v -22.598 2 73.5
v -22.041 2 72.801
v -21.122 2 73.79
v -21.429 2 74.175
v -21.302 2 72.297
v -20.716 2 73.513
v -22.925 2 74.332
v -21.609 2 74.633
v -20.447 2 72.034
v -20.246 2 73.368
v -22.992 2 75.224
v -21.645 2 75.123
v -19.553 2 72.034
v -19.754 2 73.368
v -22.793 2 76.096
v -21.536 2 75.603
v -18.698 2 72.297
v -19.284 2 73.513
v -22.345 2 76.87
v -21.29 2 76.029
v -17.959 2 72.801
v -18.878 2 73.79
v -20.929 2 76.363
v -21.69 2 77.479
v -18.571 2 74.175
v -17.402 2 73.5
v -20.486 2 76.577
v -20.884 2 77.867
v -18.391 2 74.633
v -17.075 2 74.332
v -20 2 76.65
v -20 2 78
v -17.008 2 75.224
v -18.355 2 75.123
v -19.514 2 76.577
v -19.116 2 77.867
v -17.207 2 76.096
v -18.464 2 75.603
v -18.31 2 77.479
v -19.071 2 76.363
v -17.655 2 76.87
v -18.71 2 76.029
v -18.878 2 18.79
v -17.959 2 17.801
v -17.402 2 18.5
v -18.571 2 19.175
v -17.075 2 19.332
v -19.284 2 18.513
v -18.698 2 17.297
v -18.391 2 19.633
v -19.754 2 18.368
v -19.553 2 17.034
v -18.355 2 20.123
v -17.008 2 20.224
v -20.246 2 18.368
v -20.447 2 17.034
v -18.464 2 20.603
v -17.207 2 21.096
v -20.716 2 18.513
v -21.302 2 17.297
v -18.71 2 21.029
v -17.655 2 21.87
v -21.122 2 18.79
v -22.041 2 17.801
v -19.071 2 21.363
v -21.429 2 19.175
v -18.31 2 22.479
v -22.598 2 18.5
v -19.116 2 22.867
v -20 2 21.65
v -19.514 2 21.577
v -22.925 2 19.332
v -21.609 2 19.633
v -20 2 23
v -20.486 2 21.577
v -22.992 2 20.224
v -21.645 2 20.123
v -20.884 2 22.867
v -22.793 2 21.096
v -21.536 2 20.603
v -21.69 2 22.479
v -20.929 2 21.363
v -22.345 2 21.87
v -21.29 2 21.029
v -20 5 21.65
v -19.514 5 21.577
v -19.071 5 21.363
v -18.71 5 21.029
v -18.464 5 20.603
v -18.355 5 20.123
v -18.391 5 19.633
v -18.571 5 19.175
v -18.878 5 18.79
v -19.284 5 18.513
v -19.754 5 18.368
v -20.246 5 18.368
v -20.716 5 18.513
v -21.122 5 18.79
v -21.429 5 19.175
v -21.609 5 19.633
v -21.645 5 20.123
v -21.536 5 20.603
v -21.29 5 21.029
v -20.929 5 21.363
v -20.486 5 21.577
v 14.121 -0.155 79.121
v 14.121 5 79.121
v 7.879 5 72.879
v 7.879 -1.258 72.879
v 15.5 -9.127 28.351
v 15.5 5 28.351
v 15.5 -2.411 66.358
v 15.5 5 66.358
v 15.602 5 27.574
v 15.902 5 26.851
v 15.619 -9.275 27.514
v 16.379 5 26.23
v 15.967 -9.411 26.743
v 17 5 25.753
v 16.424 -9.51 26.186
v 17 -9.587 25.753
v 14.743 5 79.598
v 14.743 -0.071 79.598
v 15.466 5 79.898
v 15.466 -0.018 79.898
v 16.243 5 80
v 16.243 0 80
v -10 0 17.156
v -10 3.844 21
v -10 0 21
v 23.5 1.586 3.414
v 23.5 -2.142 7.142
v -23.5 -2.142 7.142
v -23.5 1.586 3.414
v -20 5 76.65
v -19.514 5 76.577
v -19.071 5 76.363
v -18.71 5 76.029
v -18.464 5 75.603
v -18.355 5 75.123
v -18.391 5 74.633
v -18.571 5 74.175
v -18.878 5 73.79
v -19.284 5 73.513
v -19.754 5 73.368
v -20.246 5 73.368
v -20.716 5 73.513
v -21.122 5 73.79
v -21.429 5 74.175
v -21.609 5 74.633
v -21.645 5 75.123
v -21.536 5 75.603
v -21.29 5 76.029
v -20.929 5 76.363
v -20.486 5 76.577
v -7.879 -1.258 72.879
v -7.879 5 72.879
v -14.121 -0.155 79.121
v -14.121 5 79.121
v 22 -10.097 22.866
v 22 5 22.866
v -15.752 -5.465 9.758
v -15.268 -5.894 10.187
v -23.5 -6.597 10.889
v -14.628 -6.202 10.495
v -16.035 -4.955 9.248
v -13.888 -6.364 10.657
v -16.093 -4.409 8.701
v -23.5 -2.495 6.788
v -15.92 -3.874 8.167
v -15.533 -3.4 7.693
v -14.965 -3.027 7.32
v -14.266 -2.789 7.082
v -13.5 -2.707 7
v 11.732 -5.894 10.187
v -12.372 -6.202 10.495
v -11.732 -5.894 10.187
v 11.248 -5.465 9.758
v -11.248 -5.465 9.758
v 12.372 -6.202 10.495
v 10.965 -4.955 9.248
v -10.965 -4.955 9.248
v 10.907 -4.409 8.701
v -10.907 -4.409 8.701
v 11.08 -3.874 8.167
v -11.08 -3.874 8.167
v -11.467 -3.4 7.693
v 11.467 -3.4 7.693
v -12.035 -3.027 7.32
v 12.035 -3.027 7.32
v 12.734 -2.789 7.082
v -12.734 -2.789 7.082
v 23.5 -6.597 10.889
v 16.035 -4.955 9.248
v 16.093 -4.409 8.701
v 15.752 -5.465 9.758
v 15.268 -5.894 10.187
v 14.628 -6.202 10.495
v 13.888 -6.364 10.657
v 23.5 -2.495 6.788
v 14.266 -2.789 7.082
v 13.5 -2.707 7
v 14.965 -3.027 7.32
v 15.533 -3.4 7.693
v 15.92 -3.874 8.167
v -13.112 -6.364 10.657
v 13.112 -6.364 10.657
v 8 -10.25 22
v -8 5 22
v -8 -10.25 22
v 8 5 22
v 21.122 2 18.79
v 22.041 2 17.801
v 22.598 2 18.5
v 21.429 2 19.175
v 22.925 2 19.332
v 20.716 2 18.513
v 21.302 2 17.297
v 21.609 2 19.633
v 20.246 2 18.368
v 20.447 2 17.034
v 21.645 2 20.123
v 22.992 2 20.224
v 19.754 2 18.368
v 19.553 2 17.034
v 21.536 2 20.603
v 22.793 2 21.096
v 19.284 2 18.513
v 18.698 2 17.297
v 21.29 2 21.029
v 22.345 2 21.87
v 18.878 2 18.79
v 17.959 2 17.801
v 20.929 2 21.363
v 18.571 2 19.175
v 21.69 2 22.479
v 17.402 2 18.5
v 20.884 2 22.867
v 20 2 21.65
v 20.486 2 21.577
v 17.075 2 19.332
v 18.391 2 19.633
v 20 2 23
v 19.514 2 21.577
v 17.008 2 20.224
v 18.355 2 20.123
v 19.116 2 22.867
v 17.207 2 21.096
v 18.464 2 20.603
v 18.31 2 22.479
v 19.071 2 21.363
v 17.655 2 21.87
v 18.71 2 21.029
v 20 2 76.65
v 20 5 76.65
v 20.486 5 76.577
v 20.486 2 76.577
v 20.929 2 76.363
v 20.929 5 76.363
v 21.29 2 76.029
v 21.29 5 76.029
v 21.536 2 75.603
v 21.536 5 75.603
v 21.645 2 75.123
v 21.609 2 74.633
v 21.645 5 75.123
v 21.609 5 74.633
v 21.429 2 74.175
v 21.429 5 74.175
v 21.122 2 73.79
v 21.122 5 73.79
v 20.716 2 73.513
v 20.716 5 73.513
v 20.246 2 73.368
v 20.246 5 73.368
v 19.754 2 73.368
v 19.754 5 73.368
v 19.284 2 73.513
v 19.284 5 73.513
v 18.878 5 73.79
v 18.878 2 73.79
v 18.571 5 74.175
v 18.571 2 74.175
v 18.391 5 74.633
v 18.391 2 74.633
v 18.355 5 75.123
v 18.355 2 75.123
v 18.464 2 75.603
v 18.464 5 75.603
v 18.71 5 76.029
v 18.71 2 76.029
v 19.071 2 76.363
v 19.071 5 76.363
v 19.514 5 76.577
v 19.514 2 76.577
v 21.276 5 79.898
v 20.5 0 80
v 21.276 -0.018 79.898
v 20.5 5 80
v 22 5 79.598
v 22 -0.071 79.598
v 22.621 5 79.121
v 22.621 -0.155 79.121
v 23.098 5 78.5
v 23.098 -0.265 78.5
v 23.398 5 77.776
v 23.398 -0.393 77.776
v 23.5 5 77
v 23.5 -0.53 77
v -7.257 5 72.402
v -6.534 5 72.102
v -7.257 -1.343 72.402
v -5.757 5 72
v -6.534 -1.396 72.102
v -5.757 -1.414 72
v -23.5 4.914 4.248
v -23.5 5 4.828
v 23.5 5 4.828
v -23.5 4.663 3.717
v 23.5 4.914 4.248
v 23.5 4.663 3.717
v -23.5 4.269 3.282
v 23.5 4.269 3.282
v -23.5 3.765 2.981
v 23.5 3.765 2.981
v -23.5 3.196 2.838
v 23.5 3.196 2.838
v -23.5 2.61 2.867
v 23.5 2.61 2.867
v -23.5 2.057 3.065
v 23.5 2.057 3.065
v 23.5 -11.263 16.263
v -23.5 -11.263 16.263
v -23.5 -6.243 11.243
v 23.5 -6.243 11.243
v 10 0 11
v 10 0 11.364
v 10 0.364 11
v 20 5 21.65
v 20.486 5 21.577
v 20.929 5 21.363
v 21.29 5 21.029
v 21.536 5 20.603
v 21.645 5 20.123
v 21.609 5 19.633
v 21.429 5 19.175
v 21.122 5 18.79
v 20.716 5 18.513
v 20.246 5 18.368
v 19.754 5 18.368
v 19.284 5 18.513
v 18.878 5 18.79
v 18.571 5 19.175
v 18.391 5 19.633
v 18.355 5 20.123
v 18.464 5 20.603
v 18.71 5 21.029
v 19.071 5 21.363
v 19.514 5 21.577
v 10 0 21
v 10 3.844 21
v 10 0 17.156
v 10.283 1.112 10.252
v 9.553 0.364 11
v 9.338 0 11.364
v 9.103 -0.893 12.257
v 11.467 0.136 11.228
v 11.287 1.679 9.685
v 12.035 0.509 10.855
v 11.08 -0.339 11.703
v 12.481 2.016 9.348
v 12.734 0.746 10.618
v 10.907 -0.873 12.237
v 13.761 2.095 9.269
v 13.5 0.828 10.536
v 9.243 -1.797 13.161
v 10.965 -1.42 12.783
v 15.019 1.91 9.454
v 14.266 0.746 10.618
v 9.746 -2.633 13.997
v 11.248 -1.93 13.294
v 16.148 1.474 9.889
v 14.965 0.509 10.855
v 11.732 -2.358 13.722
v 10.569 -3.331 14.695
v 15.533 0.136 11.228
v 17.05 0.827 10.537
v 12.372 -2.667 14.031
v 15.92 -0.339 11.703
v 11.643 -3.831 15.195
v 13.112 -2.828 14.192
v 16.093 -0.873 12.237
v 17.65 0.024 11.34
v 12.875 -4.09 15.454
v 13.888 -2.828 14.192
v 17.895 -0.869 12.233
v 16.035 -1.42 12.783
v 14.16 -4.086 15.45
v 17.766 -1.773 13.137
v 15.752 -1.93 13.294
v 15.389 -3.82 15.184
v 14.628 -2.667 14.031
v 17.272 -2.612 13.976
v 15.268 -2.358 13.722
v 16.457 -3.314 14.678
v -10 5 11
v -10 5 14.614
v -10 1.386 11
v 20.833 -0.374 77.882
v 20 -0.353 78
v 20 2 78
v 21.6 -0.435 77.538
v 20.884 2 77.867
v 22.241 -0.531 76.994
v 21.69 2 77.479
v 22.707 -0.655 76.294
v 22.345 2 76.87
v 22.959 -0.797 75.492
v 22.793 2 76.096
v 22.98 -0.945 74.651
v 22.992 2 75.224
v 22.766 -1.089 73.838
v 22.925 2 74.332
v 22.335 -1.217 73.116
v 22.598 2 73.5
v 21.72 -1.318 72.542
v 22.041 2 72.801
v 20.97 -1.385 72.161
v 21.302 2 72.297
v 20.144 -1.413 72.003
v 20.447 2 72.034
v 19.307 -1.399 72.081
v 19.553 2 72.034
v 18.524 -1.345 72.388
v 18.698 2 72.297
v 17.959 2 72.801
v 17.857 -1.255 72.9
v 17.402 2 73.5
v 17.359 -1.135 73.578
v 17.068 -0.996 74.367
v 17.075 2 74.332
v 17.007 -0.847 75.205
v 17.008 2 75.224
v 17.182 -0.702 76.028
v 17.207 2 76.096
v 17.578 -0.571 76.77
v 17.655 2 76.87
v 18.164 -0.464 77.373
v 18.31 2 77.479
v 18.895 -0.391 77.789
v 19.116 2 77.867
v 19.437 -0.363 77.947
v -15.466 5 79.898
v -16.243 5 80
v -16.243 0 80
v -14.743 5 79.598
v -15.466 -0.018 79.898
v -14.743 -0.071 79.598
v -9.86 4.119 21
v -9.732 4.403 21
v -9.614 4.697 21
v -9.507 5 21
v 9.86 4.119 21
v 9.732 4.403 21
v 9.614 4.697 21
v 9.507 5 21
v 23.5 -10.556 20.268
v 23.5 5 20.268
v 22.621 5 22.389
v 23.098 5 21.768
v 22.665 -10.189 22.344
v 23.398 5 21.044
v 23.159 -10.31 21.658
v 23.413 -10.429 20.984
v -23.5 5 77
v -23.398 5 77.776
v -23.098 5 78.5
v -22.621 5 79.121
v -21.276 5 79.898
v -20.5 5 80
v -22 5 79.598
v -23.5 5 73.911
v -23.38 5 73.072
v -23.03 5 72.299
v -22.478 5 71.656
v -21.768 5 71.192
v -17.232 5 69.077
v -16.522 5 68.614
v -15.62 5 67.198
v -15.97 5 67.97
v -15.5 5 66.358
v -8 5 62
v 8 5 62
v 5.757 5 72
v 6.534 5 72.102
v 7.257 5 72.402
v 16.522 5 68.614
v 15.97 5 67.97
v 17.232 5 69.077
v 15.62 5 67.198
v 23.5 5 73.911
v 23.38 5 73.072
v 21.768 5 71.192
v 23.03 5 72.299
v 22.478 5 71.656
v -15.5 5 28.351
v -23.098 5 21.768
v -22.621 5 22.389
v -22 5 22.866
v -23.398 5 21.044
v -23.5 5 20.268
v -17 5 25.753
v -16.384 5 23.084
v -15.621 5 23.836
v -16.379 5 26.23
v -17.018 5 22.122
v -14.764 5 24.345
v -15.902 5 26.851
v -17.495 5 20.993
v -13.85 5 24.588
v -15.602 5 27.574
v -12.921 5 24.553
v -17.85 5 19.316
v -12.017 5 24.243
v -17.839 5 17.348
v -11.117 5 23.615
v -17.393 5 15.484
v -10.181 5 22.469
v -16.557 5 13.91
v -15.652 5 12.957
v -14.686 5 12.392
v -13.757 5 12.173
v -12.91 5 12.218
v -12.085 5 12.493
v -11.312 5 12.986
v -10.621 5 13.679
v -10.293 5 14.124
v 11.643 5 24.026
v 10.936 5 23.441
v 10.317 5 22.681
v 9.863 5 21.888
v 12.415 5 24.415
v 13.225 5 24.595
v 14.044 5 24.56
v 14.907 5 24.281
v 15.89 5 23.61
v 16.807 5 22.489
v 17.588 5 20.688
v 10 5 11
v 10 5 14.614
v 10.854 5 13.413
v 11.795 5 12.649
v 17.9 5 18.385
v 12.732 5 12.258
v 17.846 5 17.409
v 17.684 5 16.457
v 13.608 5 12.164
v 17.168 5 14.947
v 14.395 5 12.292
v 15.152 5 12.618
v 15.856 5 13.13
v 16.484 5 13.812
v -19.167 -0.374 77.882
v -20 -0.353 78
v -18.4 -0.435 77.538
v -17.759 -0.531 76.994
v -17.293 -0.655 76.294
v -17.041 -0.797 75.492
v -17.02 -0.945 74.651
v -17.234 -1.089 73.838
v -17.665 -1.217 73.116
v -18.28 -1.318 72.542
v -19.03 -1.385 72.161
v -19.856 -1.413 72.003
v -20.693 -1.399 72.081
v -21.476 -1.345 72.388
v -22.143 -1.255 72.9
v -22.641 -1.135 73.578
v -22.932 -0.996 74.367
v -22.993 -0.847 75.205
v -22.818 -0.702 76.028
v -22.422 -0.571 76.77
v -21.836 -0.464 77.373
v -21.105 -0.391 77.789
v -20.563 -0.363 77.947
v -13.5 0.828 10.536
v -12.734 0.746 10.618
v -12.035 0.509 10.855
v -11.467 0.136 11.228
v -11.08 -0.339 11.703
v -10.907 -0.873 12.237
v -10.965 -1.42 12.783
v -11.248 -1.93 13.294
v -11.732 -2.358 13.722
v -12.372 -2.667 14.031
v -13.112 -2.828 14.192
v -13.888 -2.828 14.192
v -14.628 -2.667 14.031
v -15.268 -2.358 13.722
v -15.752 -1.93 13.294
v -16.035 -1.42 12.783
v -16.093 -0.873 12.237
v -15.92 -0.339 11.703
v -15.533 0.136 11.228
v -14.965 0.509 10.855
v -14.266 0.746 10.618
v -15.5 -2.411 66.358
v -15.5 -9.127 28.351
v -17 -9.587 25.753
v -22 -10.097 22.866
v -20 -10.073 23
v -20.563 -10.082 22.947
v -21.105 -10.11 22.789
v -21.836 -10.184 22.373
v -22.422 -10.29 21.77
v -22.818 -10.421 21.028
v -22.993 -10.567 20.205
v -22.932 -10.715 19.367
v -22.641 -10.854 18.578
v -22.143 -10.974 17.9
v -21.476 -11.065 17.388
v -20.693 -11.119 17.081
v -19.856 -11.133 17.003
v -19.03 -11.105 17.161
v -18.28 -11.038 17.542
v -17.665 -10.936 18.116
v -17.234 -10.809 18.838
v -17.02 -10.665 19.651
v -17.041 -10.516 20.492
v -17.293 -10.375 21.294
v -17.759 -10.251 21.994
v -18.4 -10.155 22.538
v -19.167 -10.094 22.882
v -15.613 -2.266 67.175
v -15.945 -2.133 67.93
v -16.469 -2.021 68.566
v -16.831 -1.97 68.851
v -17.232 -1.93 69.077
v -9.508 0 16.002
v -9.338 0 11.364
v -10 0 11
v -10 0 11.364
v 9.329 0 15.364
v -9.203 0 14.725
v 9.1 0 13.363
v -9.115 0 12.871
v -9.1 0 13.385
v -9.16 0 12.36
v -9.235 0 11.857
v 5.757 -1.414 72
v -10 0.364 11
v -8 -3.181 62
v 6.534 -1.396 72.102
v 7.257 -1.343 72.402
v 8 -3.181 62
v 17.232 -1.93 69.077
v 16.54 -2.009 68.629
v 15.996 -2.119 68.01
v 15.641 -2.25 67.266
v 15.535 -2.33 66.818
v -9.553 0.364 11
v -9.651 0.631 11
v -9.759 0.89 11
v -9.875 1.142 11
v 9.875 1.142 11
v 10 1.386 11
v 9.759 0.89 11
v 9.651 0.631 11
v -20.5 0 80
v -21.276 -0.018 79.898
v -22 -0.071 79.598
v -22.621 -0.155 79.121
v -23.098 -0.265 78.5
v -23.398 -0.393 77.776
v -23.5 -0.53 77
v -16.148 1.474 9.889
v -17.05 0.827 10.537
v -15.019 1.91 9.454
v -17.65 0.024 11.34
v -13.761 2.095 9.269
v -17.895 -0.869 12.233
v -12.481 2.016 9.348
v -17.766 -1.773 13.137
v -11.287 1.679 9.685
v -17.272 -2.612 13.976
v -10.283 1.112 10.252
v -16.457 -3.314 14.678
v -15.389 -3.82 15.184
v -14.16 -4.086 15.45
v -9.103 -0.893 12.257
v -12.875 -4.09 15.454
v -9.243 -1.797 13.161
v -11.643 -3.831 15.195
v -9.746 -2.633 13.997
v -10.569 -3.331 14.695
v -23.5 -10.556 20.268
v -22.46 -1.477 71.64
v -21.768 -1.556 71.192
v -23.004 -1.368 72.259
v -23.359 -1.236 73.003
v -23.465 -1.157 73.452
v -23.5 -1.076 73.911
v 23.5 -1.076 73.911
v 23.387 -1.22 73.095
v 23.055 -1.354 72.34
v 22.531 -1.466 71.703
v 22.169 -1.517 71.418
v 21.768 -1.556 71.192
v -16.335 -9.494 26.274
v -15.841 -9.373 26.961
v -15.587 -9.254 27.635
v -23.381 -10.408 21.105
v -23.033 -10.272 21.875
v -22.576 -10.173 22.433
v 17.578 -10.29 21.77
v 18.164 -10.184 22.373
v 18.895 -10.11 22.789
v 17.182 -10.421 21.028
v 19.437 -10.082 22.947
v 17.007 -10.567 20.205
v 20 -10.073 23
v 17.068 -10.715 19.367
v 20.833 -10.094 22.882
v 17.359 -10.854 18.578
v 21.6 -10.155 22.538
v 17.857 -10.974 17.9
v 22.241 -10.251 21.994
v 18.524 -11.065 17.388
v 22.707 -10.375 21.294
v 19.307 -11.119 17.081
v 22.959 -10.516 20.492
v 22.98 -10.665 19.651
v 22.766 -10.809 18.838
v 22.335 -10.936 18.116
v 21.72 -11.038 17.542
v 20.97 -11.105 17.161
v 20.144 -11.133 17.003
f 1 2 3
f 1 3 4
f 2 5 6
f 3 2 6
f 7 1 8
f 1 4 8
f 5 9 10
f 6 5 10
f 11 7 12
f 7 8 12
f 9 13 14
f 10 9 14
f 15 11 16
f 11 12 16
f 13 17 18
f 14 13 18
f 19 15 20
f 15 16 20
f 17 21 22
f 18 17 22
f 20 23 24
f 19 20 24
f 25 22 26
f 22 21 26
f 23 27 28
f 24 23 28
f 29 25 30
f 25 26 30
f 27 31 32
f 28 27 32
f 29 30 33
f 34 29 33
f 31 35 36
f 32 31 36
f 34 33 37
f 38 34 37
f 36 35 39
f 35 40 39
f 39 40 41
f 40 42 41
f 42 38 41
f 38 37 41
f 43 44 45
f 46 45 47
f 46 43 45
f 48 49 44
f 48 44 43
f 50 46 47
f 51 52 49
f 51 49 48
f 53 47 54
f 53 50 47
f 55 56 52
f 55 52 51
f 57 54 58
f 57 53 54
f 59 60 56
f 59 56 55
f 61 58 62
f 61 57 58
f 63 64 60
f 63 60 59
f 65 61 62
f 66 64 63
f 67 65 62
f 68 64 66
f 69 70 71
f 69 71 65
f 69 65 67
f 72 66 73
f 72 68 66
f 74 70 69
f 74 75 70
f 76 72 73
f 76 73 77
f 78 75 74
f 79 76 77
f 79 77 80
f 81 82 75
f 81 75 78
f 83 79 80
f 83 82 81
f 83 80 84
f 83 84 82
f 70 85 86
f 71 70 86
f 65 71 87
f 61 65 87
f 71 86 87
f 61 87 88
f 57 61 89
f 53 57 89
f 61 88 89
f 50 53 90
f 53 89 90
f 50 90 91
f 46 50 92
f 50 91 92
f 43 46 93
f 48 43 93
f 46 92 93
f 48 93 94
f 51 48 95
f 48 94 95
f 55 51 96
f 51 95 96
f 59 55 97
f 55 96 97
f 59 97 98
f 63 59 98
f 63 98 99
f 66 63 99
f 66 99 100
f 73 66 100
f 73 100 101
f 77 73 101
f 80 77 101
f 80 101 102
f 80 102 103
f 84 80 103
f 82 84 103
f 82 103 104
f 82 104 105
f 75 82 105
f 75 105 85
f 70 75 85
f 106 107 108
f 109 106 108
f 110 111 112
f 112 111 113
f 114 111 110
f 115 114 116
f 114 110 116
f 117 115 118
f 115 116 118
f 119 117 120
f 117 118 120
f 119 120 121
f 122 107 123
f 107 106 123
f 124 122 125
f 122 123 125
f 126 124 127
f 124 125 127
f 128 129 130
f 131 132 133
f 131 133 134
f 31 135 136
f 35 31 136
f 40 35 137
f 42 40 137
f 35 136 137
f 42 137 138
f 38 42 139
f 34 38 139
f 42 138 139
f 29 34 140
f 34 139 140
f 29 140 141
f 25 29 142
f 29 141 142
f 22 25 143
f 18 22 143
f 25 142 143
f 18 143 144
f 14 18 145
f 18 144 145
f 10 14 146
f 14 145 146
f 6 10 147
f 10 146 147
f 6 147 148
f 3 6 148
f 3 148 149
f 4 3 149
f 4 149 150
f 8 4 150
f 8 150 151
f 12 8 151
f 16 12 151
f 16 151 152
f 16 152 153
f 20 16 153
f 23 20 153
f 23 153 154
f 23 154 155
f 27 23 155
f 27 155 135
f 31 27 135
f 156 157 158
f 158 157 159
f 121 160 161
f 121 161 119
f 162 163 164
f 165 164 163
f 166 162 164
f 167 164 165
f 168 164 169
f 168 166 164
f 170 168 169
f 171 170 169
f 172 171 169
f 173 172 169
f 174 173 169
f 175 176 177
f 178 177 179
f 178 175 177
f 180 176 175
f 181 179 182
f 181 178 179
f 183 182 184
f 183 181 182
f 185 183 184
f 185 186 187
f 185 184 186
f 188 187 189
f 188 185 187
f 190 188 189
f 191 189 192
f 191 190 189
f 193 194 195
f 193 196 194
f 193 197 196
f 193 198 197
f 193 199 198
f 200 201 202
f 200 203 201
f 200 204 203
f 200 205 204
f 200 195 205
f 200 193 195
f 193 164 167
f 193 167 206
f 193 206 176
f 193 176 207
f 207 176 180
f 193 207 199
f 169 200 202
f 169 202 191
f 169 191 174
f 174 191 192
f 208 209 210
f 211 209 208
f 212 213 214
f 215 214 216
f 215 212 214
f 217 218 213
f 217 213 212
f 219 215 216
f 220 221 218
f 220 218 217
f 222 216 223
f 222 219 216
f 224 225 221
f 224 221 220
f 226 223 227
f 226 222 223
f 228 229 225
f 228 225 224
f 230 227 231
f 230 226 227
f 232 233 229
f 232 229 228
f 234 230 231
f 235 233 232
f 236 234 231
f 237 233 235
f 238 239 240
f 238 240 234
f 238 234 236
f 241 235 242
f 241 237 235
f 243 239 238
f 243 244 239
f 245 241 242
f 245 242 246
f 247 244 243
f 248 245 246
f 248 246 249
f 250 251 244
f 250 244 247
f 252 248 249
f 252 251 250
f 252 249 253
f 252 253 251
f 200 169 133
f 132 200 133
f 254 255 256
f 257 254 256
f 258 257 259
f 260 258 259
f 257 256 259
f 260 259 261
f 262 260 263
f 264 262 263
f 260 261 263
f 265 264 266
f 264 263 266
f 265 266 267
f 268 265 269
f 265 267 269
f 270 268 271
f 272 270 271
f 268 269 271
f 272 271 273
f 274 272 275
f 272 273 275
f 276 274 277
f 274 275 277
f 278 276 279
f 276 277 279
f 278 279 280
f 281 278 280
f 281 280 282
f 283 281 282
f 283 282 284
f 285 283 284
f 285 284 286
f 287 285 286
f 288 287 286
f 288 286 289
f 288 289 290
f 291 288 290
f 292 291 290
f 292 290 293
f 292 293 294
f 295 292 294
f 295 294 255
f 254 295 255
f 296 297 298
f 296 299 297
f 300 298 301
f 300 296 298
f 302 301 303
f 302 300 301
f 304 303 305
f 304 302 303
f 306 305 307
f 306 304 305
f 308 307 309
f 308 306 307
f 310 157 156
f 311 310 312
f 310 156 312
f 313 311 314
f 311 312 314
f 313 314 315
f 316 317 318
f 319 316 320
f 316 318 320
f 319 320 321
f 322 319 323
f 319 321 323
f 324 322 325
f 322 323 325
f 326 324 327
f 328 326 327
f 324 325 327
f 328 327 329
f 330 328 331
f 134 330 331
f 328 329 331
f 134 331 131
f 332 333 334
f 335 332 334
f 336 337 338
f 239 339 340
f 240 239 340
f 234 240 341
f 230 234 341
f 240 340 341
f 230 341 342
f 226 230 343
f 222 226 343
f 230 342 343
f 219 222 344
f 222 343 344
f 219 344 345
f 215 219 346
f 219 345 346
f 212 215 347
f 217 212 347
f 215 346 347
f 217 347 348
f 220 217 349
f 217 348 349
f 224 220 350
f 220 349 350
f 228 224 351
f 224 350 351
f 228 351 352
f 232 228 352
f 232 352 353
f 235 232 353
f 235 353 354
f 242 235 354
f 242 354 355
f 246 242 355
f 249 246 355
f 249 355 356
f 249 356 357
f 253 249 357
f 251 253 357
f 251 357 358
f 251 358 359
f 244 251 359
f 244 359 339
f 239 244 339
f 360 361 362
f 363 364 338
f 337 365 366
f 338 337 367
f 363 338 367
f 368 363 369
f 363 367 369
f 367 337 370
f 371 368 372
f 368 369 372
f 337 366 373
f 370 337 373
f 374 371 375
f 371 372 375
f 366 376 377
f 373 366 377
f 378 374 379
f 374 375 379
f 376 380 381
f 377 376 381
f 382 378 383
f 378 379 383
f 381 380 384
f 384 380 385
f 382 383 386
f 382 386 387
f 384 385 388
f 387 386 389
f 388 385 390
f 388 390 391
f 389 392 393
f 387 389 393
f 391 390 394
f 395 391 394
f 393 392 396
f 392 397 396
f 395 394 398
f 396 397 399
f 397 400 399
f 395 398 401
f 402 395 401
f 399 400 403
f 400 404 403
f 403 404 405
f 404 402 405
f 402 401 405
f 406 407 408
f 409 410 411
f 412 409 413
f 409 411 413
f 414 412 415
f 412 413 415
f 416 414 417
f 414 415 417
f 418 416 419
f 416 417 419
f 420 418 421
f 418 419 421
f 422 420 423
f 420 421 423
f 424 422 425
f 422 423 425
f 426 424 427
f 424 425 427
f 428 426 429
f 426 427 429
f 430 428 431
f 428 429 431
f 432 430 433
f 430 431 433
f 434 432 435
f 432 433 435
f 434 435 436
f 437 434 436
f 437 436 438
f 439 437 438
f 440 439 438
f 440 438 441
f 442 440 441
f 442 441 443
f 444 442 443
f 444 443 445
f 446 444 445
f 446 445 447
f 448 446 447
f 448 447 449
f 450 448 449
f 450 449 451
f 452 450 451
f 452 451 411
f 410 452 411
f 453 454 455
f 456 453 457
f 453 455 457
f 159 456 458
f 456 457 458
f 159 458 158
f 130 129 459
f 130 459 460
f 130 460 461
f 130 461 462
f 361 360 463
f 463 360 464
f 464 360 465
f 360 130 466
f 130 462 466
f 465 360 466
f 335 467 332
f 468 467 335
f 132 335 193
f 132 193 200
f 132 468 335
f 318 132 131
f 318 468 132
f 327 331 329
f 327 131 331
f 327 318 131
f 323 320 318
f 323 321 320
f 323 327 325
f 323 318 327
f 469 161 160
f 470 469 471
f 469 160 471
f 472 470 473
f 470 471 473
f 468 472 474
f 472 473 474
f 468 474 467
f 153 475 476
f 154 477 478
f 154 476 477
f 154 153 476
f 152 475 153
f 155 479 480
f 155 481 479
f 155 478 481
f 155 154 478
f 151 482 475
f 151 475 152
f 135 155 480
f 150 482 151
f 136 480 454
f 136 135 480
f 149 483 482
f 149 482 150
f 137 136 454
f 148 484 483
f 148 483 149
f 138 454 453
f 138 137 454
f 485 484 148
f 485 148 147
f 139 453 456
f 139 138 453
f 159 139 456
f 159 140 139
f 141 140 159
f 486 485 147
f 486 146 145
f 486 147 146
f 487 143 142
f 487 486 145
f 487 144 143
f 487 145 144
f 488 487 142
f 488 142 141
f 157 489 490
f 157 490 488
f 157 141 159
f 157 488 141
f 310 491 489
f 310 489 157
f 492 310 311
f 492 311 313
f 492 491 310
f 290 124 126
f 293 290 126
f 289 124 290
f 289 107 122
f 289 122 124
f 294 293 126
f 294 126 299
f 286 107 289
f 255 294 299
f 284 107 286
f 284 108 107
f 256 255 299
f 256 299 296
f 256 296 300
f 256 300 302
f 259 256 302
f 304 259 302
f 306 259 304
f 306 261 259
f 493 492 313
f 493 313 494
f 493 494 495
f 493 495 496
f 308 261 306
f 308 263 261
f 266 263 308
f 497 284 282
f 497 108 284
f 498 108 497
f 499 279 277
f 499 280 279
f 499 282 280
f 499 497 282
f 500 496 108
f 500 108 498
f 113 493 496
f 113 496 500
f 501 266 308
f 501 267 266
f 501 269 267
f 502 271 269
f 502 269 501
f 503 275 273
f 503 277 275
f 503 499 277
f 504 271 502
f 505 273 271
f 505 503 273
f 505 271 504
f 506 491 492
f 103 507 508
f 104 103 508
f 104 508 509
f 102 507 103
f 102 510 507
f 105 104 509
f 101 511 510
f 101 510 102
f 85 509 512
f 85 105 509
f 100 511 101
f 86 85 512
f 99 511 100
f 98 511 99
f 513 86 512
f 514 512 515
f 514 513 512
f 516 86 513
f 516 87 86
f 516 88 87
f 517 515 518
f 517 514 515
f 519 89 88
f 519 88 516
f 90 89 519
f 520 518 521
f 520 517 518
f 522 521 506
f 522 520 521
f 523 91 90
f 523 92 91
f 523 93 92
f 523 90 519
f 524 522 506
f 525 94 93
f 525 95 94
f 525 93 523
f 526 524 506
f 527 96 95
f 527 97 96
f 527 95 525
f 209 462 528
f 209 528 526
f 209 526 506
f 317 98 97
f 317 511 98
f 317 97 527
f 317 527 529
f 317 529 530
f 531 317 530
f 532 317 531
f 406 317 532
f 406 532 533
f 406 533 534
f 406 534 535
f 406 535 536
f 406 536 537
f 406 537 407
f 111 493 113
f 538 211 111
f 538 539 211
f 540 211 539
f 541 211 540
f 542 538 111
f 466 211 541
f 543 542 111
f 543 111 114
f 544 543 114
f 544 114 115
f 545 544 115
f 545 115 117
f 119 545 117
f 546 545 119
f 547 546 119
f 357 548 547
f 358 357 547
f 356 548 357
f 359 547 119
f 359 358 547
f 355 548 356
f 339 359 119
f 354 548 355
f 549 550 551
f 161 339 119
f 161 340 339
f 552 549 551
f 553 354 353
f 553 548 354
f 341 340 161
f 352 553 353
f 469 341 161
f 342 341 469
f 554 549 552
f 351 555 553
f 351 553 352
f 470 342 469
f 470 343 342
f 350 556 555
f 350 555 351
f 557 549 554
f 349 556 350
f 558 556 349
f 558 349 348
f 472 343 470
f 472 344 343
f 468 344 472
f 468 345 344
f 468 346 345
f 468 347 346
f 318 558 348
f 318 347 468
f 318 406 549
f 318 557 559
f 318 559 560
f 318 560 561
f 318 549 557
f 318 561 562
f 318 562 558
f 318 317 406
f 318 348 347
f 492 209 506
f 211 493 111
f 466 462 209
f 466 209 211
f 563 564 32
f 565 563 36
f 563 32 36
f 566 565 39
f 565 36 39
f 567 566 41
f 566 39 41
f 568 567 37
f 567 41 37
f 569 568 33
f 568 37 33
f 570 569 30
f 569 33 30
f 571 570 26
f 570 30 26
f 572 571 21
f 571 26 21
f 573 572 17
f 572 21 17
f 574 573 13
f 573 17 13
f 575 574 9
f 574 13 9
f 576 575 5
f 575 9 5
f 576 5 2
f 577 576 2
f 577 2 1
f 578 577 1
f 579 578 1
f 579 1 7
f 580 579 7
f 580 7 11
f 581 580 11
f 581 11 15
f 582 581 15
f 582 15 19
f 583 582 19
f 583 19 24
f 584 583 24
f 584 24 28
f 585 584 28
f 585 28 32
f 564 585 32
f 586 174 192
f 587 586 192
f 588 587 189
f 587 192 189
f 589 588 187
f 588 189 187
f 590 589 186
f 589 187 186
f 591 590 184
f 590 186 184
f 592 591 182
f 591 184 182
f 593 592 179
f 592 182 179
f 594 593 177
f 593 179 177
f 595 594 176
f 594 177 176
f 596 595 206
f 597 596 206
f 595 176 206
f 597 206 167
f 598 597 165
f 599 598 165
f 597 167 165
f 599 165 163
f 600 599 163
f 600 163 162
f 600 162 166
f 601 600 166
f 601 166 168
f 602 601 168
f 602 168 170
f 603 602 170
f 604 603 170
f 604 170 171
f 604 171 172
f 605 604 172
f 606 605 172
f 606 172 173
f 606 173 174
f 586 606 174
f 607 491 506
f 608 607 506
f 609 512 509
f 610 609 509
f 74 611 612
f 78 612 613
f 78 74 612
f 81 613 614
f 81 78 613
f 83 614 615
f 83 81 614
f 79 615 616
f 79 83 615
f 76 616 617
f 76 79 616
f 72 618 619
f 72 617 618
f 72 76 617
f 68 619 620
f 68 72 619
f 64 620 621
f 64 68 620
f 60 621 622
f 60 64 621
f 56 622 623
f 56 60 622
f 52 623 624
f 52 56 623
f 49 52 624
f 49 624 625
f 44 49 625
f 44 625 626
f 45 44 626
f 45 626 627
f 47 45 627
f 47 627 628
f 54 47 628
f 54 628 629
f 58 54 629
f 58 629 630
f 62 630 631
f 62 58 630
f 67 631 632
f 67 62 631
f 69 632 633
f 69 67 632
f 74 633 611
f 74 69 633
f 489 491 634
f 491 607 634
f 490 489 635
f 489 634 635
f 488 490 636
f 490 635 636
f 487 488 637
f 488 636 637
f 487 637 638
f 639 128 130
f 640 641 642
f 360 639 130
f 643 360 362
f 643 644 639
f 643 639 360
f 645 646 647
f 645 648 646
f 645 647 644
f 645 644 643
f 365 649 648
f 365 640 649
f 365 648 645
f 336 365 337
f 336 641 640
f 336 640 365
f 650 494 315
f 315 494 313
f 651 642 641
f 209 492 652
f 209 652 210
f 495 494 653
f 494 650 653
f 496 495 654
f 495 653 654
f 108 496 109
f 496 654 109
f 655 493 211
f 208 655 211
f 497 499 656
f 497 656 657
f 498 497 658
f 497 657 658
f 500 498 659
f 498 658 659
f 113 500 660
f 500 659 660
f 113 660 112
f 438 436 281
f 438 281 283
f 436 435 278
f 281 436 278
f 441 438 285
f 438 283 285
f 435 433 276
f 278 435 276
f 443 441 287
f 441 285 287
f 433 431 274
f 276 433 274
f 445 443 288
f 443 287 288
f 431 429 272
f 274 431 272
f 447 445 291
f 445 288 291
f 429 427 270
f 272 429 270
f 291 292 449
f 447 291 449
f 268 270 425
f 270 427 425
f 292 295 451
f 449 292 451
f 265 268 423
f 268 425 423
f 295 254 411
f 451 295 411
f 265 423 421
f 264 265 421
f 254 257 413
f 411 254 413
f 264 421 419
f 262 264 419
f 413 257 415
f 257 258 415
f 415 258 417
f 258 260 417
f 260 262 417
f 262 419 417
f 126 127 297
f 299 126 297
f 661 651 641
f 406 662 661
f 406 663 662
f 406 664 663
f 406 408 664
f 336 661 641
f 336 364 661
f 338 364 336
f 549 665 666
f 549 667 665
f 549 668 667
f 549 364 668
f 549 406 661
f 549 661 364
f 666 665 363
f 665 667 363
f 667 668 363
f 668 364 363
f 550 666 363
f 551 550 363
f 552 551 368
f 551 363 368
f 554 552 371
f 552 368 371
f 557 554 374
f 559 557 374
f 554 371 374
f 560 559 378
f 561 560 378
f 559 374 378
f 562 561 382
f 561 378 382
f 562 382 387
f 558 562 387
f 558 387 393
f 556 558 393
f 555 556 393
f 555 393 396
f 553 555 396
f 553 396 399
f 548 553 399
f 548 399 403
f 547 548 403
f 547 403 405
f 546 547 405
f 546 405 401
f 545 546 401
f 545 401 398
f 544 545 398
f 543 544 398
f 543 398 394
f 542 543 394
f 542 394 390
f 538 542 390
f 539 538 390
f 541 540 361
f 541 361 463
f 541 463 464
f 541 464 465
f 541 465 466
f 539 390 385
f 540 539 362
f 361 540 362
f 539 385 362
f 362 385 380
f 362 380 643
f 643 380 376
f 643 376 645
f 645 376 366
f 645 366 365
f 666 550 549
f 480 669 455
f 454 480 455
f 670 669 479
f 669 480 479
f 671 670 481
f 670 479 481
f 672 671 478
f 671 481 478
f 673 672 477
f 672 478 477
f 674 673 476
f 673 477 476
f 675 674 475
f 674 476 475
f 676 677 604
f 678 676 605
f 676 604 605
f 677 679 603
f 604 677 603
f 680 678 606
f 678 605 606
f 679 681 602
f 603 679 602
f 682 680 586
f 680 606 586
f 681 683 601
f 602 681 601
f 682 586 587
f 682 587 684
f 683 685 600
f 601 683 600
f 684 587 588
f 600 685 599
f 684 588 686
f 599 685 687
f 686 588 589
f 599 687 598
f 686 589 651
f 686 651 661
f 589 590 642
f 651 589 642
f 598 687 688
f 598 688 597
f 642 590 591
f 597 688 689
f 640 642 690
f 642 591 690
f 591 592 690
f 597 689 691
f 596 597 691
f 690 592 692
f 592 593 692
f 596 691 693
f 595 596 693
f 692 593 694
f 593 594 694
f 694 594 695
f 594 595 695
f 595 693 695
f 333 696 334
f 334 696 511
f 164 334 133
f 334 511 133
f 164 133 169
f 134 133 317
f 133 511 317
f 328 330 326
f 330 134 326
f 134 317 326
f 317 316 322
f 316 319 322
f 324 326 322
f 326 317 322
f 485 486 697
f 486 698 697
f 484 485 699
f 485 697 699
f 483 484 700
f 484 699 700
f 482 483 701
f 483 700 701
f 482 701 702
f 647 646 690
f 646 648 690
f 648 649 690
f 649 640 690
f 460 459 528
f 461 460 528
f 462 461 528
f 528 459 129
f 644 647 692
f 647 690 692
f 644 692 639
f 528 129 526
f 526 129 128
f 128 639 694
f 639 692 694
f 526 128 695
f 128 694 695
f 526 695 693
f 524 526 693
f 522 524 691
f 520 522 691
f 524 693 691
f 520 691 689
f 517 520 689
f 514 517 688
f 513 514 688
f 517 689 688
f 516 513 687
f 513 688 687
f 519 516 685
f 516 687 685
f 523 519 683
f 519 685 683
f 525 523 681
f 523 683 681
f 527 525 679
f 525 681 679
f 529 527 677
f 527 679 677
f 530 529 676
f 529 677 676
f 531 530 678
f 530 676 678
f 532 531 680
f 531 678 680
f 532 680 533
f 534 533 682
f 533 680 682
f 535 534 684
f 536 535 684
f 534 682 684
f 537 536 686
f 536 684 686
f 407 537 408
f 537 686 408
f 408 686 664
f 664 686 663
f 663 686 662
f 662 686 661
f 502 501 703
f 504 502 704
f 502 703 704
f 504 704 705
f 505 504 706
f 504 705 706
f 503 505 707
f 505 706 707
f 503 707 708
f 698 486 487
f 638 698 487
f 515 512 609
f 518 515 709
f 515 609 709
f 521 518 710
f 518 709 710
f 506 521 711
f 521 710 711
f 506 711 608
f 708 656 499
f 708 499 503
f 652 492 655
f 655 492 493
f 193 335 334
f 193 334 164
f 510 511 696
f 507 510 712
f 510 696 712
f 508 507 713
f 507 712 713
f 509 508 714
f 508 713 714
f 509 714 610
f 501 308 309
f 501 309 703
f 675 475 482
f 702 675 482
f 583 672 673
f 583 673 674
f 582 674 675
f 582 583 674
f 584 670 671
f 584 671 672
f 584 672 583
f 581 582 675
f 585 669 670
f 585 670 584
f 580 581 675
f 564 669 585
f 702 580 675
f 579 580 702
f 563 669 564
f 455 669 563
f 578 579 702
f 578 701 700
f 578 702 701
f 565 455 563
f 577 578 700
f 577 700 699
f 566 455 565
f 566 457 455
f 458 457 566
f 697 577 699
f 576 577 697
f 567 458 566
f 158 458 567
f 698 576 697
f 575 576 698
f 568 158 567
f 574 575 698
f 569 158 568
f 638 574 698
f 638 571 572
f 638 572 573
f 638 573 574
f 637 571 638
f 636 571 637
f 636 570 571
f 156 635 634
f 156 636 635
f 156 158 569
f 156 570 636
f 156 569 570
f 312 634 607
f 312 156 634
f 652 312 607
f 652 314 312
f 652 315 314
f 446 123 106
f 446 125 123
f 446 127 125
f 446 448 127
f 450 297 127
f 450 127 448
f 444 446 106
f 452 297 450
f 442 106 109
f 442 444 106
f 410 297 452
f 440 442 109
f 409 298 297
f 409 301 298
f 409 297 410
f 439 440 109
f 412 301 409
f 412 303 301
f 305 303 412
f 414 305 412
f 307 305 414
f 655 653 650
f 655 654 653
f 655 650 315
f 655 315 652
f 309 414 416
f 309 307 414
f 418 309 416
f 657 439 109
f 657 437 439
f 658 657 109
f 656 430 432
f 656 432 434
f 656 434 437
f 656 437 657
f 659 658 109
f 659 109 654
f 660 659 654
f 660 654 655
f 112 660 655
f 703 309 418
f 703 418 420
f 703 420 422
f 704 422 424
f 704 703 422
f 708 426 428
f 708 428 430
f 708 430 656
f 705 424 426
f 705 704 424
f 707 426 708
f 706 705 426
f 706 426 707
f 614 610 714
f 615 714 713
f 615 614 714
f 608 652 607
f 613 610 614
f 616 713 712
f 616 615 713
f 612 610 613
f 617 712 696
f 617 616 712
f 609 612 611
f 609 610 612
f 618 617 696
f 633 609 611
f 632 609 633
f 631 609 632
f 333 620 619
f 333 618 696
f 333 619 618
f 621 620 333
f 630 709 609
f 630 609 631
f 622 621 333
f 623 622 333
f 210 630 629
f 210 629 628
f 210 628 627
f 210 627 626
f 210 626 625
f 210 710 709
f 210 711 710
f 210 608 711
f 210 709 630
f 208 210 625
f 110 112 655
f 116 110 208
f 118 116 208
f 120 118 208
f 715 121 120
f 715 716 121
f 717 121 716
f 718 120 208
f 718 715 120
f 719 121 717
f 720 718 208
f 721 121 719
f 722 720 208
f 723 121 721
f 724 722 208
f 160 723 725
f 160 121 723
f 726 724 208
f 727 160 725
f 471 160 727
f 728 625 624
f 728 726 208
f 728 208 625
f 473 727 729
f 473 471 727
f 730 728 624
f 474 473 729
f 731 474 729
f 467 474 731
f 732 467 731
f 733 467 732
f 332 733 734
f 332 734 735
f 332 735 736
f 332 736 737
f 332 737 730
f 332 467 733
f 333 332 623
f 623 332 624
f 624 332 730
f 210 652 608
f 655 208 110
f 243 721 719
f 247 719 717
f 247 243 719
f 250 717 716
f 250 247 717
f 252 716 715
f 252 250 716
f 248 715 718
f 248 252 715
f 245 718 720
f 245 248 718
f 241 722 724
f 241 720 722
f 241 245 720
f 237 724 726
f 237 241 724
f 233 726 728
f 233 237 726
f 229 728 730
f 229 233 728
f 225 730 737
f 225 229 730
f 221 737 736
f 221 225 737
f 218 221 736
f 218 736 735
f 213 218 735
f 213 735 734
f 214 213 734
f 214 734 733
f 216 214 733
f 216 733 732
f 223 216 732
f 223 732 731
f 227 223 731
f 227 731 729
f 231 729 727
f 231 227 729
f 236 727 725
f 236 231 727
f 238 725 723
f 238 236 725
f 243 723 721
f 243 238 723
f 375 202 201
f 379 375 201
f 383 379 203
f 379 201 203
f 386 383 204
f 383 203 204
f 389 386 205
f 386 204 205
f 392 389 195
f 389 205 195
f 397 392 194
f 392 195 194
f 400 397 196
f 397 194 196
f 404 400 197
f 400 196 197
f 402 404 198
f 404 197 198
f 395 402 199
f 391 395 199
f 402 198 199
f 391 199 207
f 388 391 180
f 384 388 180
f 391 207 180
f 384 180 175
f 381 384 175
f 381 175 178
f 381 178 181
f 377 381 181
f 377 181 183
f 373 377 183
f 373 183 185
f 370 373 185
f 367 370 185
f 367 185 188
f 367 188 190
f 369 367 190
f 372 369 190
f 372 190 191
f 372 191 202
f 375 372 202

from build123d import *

# Parameters (mm, degrees)
EXTRUDE_2_DEPTH      = 5
EXTRUDE_3_DEPTH      = 23.5
SKETCH_3_R           = 1.65
CUT_EXTRUDE_1_DEPTH  = 85.951456727
CUT_EXTRUDE_5_REACH  = 89.951
CUT_EXTRUDE_START    = 3
SKETCH_8_R           = 3
CUT_EXTRUDE_10_REACH = 89.951
CUT_EXTRUDE_START_2  = -3
SKETCH_12_R          = 3
SKETCH_4_W           = 20
SKETCH_4_H           = 10
CUT_EXTRUDE_2_DEPTH  = 5
SKETCH_10_W          = 16
SKETCH_10_H          = 40
CUT_EXTRUDE_11_DEPTH = 85.951456727
FILLET_1_R           = 3
CUT_EXTRUDE_6_DEPTH  = 94.465851734
SKETCH_6_R           = 2.6
CUT_EXTRUDE_3_DEPTH  = 83.421182124
CUT_EXTRUDE_4_REACH  = 89.421
CUT_EXTRUDE_START_3  = -5
SKETCH_7_R           = 4.4
FILLET_3_R           = 2


with BuildPart() as part:
    # 草图2 → 凸台-拉伸2 (new body)
    with BuildSketch(Plane(origin=(0, 0, 0), x_dir=(1, 0, 0), z_dir=(0, 1, 0))):
        Polygon((0, 0), (23.5, 0), (23.5, -19), (23.5, -80), (0, -80), align=None)
    extrude_2 = extrude(amount=EXTRUDE_2_DEPTH)

    # 镜向1: 凸台-拉伸2 across plane
    add(extrude_2.mirror(Plane(origin=(0, 5, 80), x_dir=(0, 0, 1), z_dir=(1, 0, 0))))

    # 草图5 → 凸台-拉伸3 (add, symmetric)
    with BuildSketch(Plane(origin=(0, 0, 0), x_dir=(0, 0, -1), z_dir=(1, 0, 0))):
        Polygon((-80, 0), (-16.263455967, -11.263455967), (-11.242997821, -6.242997821), (-10.88944443, -6.596551211), (-6.788225099, -2.495331881), (-7.14177849, -2.14177849), (-5, 0), align=None)
    extrude(amount=EXTRUDE_3_DEPTH, both=True)

    # 草图3 → 切除-拉伸1 (cut, through all)
    with BuildSketch(Plane(origin=(0, 5, 0), x_dir=(1, 0, 0), z_dir=(0, 1, 0))):
        with Locations(Location((-20, -20, 0), (0, 0, 270))):
            Circle(SKETCH_3_R)
        with Locations(Location((20, -20, 0), (0, 0, 270))):
            Circle(SKETCH_3_R)
        with Locations(Location((-20, -75, 0), (0, 0, 270))):
            Circle(SKETCH_3_R)
        with Locations(Location((20, -75, 0), (0, 0, 270))):
            Circle(SKETCH_3_R)
    extrude(amount=-CUT_EXTRUDE_1_DEPTH, mode=Mode.SUBTRACT)

    # 切除-拉伸5: up to this plane
    cut_extrude_5_end = Plane(origin=(23.5, -13.709378738, 2.422707194), z_dir=(0, 0.9847416717466503, -0.174022527063632))
    # 草图8 → 切除-拉伸5 (cut, up to the surface)
    with BuildSketch(Plane.XZ.offset(-5).offset(CUT_EXTRUDE_START), mode=Mode.PRIVATE) as cut_extrude_5_sk1:
        with Locations(Location((-20, 20, 0), (0, 0, 90))):
            Circle(SKETCH_8_R)
    cut_extrude_5_tool1 = split(extrude(cut_extrude_5_sk1.sketch, amount=CUT_EXTRUDE_5_REACH, mode=Mode.PRIVATE), bisect_by=cut_extrude_5_end, keep=Keep.BOTH, mode=Mode.PRIVATE)
    add(cut_extrude_5_tool1.solids().sort_by_distance((-20, 2, 20))[0], mode=Mode.SUBTRACT)
    # 草图8 → 切除-拉伸5 (cut, up to the surface)
    with BuildSketch(Plane.XZ.offset(-5).offset(CUT_EXTRUDE_START), mode=Mode.PRIVATE) as cut_extrude_5_sk2:
        with Locations(Location((20, 20, 0), (0, 0, 90))):
            Circle(SKETCH_8_R)
    cut_extrude_5_tool2 = split(extrude(cut_extrude_5_sk2.sketch, amount=CUT_EXTRUDE_5_REACH, mode=Mode.PRIVATE), bisect_by=cut_extrude_5_end, keep=Keep.BOTH, mode=Mode.PRIVATE)
    add(cut_extrude_5_tool2.solids().sort_by_distance((20, 2, 20))[0], mode=Mode.SUBTRACT)

    # 切除-拉伸10: up to this plane
    cut_extrude_10_end = Plane(origin=(23.5, -13.709378738, 2.422707194), z_dir=(0, 0.9847416717466503, -0.174022527063632))
    # 草图12 → 切除-拉伸10 (cut, up to the surface)
    with BuildSketch(Plane(origin=(0, 5, 0), x_dir=(1, 0, 0), z_dir=(0, 1, 0)).offset(CUT_EXTRUDE_START_2), mode=Mode.PRIVATE) as cut_extrude_10_sk1:
        with Locations(Location((-20, -75, 0), (0, 0, 270))):
            Circle(SKETCH_12_R)
    cut_extrude_10_tool1 = split(extrude(cut_extrude_10_sk1.sketch, amount=-CUT_EXTRUDE_10_REACH, mode=Mode.PRIVATE), bisect_by=cut_extrude_10_end, keep=Keep.BOTH, mode=Mode.PRIVATE)
    add(cut_extrude_10_tool1.solids().sort_by_distance((-20, 2, 75))[0], mode=Mode.SUBTRACT)
    # 草图12 → 切除-拉伸10 (cut, up to the surface)
    with BuildSketch(Plane(origin=(0, 5, 0), x_dir=(1, 0, 0), z_dir=(0, 1, 0)).offset(CUT_EXTRUDE_START_2), mode=Mode.PRIVATE) as cut_extrude_10_sk2:
        with Locations(Location((20, -75, 0), (0, 0, 270))):
            Circle(SKETCH_12_R)
    cut_extrude_10_tool2 = split(extrude(cut_extrude_10_sk2.sketch, amount=-CUT_EXTRUDE_10_REACH, mode=Mode.PRIVATE), bisect_by=cut_extrude_10_end, keep=Keep.BOTH, mode=Mode.PRIVATE)
    add(cut_extrude_10_tool2.solids().sort_by_distance((20, 2, 75))[0], mode=Mode.SUBTRACT)

    # 草图4 → 切除-拉伸2 (cut)
    with BuildSketch(Plane(origin=(0, 5, 0), x_dir=(1, 0, 0), z_dir=(0, 1, 0))):
        with Locations((0, -16)):
            Rectangle(SKETCH_4_W, SKETCH_4_H)
    extrude(amount=-CUT_EXTRUDE_2_DEPTH, mode=Mode.SUBTRACT)

    # 草图10 → 切除-拉伸11 (cut, through all)
    with BuildSketch(Plane(origin=(0, 5, 0), x_dir=(1, 0, 0), z_dir=(0, 1, 0))):
        with Locations((0, -42)):
            Rectangle(SKETCH_10_W, SKETCH_10_H)
        Polygon((-7, -72), (-15, -80), (15, -80), (7, -72), align=None)
        Polygon((23.5, -22), (15.5, -26.618802154), (15.5, -68.269538735), (23.5, -72), align=None)
        Polygon((-15.5, -26.618802154), (-23.5, -22), (-23.5, -72), (-15.5, -68.269538735), align=None)
    extrude(amount=-CUT_EXTRUDE_11_DEPTH, mode=Mode.SUBTRACT)

    # 圆角1
    fillet_1_edges = [part.edges().sort_by_distance(p)[0] for p in [
        (-23.5, -2.624849927, 22),
        (-23.5, 1.793124148, 72),
        (23.5, 1.793124148, 72),
        (23.5, -2.624849927, 22),
        (15, 2.5, 80),
        (-15, 2.5, 80),
        (-15.5, -2.216734964, 26.618802154),
        (-15.5, 1.463502525, 68.269538735),
        (15.5, 1.463502525, 68.269538735),
        (15.5, -2.216734964, 26.618802154),
        (-7, 1.793124148, 72),
        (7, 1.793124148, 72),
        (-23.5, 2.5, 80),
        (23.5, 2.5, 80),
    ]]
    fillet(fillet_1_edges, radius=FILLET_1_R)

    # 草图9 → 切除-拉伸6 (cut, through all)
    with BuildSketch(Plane(origin=(23.5, 0, 0), x_dir=(0, 0, -1), z_dir=(1, 0, 0))):
        Polygon((-5, 0), (0, 5), (0, 0), align=None)
    extrude(amount=-CUT_EXTRUDE_6_DEPTH, mode=Mode.SUBTRACT)

    # 草图6 → 切除-拉伸3 (cut, through all)
    with BuildSketch(Plane(origin=(0, 2.146446609, 2.146446609), x_dir=(1, 0, 0), z_dir=(0, -0.7071067811865459, -0.7071067811865491))):
        with Locations(Location((-13.5, 9.464466094, 0), (0, 0, 270))):
            Circle(SKETCH_6_R)
        with Locations(Location((13.5, 9.464466094, 0), (0, 0, 270))):
            Circle(SKETCH_6_R)
    extrude(amount=-CUT_EXTRUDE_3_DEPTH, mode=Mode.SUBTRACT)

    # 草图7 → 切除-拉伸4 (cut, up to next)
    with BuildSketch(Plane(origin=(0, 2.146446609, 2.146446609), x_dir=(1, 0, 0), z_dir=(0, -0.7071067811865459, -0.7071067811865491)).offset(CUT_EXTRUDE_START_3), mode=Mode.PRIVATE) as cut_extrude_4_sk1:
        with Locations((-13.5, 9.464466094)):
            Circle(SKETCH_7_R)
    cut_extrude_4_tool1 = extrude(cut_extrude_4_sk1.sketch, amount=-CUT_EXTRUDE_4_REACH, mode=Mode.PRIVATE) & part.part
    # 草图7 → 切除-拉伸4 (cut, up to next)
    with BuildSketch(Plane(origin=(0, 2.146446609, 2.146446609), x_dir=(1, 0, 0), z_dir=(0, -0.7071067811865459, -0.7071067811865491)).offset(CUT_EXTRUDE_START_3), mode=Mode.PRIVATE) as cut_extrude_4_sk2:
        with Locations((13.5, 9.464466094)):
            Circle(SKETCH_7_R)
    cut_extrude_4_tool2 = extrude(cut_extrude_4_sk2.sketch, amount=-CUT_EXTRUDE_4_REACH, mode=Mode.PRIVATE) & part.part
    add(cut_extrude_4_tool1.solids().sort_by_distance((-13.5, -1.010408, 12.374369))[0], mode=Mode.SUBTRACT)
    add(cut_extrude_4_tool2.solids().sort_by_distance((13.5, -1.010408, 12.374369))[0], mode=Mode.SUBTRACT)

    # 圆角3
    fillet_3_edges = [part.edges().sort_by_distance(p)[0] for p in [
        (0, 5, 0),
    ]]
    fillet(fillet_3_edges, radius=FILLET_3_R)


solid = part.part
